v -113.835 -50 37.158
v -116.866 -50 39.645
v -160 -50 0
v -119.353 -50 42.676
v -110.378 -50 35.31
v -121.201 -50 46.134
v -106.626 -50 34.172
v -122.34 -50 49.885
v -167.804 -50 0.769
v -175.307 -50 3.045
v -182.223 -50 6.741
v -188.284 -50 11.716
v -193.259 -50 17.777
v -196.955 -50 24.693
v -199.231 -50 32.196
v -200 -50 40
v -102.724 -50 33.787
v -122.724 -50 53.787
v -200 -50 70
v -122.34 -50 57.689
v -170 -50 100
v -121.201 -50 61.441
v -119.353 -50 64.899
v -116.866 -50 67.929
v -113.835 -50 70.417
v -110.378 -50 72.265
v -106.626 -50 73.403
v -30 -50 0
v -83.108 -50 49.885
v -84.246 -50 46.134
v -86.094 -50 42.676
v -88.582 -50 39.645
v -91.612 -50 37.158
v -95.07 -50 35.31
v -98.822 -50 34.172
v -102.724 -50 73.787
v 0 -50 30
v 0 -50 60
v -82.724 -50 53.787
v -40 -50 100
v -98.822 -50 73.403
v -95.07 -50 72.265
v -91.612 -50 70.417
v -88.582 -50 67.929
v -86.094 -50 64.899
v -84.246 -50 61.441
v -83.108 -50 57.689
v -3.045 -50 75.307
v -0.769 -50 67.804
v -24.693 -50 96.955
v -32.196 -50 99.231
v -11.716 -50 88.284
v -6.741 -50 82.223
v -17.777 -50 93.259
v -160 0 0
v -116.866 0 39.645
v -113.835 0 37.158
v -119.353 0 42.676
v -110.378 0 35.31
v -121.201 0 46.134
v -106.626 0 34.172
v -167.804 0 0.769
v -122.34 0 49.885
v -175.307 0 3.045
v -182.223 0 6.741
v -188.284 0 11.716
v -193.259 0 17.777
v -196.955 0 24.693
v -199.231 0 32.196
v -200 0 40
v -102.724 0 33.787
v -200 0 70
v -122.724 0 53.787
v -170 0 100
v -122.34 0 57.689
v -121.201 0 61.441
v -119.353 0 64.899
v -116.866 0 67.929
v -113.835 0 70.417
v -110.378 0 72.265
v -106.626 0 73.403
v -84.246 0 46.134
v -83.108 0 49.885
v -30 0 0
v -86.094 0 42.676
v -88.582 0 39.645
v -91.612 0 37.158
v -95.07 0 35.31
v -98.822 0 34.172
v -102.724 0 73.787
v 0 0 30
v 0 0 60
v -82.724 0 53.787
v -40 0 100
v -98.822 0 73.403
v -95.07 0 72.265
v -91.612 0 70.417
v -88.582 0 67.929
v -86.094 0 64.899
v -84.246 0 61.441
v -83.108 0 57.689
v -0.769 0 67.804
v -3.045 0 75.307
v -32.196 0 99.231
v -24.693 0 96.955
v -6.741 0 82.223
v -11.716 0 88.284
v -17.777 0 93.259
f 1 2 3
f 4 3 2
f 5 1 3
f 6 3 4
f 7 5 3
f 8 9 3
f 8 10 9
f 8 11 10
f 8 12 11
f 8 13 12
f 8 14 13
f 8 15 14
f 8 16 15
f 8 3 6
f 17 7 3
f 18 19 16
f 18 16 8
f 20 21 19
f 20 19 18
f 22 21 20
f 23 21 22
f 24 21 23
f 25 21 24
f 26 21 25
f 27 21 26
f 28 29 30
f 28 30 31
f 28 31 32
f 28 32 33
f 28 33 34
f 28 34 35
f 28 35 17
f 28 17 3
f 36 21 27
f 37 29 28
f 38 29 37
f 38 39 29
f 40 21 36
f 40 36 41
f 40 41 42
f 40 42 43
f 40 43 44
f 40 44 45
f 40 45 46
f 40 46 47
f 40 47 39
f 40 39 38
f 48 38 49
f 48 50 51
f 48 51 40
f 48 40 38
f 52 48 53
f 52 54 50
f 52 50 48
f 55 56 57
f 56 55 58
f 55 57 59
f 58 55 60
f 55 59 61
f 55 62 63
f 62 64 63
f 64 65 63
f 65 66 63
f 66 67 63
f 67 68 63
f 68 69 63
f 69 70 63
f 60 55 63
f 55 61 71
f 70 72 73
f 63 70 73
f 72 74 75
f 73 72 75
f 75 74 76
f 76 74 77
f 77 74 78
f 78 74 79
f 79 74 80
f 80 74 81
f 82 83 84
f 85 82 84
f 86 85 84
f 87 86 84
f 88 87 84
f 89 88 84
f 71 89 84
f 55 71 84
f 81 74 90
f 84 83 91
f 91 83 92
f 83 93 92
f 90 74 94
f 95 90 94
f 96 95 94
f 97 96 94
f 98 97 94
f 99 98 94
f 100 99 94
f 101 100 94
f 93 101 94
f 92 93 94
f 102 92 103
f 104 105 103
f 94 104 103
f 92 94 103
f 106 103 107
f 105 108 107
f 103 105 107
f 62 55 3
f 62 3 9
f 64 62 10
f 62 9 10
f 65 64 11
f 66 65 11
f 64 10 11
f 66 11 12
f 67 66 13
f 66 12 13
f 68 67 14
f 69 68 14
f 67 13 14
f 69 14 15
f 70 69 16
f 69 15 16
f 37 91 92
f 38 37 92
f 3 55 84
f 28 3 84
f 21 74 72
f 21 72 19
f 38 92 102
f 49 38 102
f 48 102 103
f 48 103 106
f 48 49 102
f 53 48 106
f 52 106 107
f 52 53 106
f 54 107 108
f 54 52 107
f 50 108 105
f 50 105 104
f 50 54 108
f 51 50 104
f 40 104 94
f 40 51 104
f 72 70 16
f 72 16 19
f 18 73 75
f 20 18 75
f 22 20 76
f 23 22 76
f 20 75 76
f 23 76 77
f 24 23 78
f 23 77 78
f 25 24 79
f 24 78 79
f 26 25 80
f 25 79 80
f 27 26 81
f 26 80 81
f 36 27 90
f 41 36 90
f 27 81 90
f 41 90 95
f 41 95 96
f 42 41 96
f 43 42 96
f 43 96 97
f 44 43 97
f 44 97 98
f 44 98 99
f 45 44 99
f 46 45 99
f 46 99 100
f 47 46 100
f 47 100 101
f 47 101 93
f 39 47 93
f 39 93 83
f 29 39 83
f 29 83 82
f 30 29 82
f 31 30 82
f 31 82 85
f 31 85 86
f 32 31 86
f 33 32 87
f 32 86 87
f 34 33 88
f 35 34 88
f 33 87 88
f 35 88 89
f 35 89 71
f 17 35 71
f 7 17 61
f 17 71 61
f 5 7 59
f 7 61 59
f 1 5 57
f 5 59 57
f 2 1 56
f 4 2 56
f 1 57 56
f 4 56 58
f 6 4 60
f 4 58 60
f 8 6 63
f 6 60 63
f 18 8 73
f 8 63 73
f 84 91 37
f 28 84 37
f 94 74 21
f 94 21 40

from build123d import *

# Parameters (mm, degrees)
F0_W     = 200
F0_H     = 100
F1_DEPTH = 50
F2_SIZE  = 30
F3_SIZE  = 30
F4_R     = 40
F5_R     = 40
F7_D     = 40


with BuildPart() as f1:
    # F0 (on Front) → F1 (new body)
    with BuildSketch(Plane.XZ):
        with Locations((-100, 50)):
            Rectangle(F0_W, F0_H)
    extrude(amount=F1_DEPTH)

    # F2
    f2_edges = [f1.edges().sort_by_distance(p)[0] for p in [
        (-200, -25, 100),
    ]]
    chamfer(f2_edges, length=F2_SIZE)

    # F3
    f3_edges = [f1.edges().sort_by_distance(p)[0] for p in [
        (0, -25, 0),
    ]]
    chamfer(f3_edges, length=F3_SIZE)

    # F4
    f4_edges = [f1.edges().sort_by_distance(p)[0] for p in [
        (0, -25, 100),
    ]]
    fillet(f4_edges, radius=F4_R)

    # F5
    f5_edges = [f1.edges().sort_by_distance(p)[0] for p in [
        (-200, -25, 0),
    ]]
    fillet(f5_edges, radius=F5_R)

    # F7 (through all)
    with Locations(Plane.XZ.offset(50)):
        with Locations((-102.723882, 53.78725)):
            Hole(F7_D / 2)


solid = f1.part
